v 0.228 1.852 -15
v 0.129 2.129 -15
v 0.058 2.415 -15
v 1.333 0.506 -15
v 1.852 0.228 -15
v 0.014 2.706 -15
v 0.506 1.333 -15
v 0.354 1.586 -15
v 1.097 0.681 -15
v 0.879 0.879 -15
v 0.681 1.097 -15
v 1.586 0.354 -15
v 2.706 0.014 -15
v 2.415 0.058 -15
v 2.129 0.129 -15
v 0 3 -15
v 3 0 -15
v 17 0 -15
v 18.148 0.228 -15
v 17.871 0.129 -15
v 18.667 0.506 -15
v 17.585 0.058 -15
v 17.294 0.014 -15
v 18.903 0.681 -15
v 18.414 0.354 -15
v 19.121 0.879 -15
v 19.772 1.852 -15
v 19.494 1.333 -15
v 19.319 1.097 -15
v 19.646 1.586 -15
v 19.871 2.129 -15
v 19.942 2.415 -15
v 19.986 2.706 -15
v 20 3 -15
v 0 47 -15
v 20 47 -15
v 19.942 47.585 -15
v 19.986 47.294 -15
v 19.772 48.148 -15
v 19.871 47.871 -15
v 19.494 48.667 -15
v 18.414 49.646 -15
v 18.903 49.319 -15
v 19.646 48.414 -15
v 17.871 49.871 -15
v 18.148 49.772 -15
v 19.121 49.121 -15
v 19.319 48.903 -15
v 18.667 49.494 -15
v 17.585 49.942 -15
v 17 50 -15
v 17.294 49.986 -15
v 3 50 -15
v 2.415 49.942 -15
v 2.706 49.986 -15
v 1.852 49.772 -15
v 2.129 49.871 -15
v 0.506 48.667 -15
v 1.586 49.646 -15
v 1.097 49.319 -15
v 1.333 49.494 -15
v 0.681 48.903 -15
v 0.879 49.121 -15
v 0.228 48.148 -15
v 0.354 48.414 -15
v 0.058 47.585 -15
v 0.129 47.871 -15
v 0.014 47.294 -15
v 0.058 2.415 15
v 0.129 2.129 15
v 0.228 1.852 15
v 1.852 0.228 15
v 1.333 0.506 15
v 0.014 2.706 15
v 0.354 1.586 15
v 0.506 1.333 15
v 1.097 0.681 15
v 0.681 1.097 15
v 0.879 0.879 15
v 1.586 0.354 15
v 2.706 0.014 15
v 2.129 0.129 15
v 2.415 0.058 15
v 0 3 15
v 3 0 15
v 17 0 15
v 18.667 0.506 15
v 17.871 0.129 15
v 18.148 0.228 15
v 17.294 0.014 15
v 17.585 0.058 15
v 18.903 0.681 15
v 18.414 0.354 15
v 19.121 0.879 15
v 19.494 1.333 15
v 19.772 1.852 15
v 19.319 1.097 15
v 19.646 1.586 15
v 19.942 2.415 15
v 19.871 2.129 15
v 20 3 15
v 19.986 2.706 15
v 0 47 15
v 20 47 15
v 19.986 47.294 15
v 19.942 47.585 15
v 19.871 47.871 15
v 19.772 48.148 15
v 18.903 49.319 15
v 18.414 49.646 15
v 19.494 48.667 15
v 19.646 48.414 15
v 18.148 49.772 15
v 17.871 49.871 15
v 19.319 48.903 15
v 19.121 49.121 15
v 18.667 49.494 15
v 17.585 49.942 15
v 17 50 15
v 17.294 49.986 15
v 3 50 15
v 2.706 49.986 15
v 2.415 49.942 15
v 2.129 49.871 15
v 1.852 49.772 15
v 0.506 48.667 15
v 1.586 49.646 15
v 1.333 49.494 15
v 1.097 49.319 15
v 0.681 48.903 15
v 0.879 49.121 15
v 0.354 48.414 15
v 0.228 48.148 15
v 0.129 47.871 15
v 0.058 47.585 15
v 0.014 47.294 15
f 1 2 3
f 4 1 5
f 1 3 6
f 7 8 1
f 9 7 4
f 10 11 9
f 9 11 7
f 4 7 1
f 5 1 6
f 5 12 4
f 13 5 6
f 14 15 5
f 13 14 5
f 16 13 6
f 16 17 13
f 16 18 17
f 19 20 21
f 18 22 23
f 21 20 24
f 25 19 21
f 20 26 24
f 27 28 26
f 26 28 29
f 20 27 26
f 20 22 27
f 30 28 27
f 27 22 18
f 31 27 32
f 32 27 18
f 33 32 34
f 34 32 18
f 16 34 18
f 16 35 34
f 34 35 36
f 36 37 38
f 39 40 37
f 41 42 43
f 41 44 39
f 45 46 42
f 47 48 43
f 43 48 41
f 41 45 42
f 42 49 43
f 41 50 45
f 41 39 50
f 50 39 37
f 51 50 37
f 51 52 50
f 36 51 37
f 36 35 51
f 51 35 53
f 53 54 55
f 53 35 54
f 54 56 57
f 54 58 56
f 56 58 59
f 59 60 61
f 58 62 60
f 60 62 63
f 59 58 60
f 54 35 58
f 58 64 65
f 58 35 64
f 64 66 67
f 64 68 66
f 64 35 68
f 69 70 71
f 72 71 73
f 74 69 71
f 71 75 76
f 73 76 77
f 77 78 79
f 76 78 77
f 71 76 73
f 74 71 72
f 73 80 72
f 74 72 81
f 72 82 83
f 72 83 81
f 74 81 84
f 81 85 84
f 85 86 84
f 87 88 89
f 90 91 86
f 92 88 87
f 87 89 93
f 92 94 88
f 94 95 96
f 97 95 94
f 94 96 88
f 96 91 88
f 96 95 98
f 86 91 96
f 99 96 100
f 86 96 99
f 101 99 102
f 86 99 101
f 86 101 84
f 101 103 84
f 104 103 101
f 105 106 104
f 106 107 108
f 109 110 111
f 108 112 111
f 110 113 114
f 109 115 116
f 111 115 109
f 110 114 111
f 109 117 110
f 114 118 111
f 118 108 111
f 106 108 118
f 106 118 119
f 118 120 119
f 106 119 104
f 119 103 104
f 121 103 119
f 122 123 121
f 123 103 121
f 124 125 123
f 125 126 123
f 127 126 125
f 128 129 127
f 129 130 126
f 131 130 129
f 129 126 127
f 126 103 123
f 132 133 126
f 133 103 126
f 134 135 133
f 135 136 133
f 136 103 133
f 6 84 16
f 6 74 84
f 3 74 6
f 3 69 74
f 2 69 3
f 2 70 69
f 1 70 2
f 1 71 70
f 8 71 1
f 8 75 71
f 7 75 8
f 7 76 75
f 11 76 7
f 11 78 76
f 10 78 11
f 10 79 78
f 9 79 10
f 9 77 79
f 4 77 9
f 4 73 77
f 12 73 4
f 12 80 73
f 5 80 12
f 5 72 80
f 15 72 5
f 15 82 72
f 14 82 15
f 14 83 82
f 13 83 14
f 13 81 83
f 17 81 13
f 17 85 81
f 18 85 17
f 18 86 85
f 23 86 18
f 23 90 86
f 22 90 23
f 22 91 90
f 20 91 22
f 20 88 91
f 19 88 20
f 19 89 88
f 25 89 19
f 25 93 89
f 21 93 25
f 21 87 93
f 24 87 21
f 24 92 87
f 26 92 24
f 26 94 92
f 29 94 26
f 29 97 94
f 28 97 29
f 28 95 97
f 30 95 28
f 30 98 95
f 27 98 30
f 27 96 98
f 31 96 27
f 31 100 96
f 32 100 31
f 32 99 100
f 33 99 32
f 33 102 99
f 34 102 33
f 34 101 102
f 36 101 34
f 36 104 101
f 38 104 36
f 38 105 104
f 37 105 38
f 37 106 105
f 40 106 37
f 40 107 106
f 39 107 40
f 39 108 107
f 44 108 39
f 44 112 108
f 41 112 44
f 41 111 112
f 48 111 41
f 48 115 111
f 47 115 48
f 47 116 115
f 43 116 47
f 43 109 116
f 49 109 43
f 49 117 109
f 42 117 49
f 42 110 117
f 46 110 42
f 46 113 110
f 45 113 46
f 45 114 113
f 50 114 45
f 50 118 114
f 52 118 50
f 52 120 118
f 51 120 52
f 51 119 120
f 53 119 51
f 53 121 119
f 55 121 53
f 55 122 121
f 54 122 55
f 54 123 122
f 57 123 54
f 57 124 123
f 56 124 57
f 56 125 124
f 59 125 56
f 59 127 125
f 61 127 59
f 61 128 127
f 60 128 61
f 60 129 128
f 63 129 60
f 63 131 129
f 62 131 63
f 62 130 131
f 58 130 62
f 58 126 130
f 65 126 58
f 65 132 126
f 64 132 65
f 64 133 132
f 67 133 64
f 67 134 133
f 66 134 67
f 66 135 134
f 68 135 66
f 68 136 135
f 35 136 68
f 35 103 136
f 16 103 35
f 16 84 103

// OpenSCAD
// Parameters
width = 20;
length = 50;
height = 30;
radius = 3;

// Rounded rectangular prism
module rounded_prism(w, l, h, r) {
    linear_extrude(height = h, center = true)
        hull() {
            translate([r, r])
                circle(r = r, $fn = 64);
            translate([w - r, r])
                circle(r = r, $fn = 64);
            translate([w - r, l - r])
                circle(r = r, $fn = 64);
            translate([r, l - r])
                circle(r = r, $fn = 64);
        }
}

// Render
rounded_prism(width, length, height, radius);
